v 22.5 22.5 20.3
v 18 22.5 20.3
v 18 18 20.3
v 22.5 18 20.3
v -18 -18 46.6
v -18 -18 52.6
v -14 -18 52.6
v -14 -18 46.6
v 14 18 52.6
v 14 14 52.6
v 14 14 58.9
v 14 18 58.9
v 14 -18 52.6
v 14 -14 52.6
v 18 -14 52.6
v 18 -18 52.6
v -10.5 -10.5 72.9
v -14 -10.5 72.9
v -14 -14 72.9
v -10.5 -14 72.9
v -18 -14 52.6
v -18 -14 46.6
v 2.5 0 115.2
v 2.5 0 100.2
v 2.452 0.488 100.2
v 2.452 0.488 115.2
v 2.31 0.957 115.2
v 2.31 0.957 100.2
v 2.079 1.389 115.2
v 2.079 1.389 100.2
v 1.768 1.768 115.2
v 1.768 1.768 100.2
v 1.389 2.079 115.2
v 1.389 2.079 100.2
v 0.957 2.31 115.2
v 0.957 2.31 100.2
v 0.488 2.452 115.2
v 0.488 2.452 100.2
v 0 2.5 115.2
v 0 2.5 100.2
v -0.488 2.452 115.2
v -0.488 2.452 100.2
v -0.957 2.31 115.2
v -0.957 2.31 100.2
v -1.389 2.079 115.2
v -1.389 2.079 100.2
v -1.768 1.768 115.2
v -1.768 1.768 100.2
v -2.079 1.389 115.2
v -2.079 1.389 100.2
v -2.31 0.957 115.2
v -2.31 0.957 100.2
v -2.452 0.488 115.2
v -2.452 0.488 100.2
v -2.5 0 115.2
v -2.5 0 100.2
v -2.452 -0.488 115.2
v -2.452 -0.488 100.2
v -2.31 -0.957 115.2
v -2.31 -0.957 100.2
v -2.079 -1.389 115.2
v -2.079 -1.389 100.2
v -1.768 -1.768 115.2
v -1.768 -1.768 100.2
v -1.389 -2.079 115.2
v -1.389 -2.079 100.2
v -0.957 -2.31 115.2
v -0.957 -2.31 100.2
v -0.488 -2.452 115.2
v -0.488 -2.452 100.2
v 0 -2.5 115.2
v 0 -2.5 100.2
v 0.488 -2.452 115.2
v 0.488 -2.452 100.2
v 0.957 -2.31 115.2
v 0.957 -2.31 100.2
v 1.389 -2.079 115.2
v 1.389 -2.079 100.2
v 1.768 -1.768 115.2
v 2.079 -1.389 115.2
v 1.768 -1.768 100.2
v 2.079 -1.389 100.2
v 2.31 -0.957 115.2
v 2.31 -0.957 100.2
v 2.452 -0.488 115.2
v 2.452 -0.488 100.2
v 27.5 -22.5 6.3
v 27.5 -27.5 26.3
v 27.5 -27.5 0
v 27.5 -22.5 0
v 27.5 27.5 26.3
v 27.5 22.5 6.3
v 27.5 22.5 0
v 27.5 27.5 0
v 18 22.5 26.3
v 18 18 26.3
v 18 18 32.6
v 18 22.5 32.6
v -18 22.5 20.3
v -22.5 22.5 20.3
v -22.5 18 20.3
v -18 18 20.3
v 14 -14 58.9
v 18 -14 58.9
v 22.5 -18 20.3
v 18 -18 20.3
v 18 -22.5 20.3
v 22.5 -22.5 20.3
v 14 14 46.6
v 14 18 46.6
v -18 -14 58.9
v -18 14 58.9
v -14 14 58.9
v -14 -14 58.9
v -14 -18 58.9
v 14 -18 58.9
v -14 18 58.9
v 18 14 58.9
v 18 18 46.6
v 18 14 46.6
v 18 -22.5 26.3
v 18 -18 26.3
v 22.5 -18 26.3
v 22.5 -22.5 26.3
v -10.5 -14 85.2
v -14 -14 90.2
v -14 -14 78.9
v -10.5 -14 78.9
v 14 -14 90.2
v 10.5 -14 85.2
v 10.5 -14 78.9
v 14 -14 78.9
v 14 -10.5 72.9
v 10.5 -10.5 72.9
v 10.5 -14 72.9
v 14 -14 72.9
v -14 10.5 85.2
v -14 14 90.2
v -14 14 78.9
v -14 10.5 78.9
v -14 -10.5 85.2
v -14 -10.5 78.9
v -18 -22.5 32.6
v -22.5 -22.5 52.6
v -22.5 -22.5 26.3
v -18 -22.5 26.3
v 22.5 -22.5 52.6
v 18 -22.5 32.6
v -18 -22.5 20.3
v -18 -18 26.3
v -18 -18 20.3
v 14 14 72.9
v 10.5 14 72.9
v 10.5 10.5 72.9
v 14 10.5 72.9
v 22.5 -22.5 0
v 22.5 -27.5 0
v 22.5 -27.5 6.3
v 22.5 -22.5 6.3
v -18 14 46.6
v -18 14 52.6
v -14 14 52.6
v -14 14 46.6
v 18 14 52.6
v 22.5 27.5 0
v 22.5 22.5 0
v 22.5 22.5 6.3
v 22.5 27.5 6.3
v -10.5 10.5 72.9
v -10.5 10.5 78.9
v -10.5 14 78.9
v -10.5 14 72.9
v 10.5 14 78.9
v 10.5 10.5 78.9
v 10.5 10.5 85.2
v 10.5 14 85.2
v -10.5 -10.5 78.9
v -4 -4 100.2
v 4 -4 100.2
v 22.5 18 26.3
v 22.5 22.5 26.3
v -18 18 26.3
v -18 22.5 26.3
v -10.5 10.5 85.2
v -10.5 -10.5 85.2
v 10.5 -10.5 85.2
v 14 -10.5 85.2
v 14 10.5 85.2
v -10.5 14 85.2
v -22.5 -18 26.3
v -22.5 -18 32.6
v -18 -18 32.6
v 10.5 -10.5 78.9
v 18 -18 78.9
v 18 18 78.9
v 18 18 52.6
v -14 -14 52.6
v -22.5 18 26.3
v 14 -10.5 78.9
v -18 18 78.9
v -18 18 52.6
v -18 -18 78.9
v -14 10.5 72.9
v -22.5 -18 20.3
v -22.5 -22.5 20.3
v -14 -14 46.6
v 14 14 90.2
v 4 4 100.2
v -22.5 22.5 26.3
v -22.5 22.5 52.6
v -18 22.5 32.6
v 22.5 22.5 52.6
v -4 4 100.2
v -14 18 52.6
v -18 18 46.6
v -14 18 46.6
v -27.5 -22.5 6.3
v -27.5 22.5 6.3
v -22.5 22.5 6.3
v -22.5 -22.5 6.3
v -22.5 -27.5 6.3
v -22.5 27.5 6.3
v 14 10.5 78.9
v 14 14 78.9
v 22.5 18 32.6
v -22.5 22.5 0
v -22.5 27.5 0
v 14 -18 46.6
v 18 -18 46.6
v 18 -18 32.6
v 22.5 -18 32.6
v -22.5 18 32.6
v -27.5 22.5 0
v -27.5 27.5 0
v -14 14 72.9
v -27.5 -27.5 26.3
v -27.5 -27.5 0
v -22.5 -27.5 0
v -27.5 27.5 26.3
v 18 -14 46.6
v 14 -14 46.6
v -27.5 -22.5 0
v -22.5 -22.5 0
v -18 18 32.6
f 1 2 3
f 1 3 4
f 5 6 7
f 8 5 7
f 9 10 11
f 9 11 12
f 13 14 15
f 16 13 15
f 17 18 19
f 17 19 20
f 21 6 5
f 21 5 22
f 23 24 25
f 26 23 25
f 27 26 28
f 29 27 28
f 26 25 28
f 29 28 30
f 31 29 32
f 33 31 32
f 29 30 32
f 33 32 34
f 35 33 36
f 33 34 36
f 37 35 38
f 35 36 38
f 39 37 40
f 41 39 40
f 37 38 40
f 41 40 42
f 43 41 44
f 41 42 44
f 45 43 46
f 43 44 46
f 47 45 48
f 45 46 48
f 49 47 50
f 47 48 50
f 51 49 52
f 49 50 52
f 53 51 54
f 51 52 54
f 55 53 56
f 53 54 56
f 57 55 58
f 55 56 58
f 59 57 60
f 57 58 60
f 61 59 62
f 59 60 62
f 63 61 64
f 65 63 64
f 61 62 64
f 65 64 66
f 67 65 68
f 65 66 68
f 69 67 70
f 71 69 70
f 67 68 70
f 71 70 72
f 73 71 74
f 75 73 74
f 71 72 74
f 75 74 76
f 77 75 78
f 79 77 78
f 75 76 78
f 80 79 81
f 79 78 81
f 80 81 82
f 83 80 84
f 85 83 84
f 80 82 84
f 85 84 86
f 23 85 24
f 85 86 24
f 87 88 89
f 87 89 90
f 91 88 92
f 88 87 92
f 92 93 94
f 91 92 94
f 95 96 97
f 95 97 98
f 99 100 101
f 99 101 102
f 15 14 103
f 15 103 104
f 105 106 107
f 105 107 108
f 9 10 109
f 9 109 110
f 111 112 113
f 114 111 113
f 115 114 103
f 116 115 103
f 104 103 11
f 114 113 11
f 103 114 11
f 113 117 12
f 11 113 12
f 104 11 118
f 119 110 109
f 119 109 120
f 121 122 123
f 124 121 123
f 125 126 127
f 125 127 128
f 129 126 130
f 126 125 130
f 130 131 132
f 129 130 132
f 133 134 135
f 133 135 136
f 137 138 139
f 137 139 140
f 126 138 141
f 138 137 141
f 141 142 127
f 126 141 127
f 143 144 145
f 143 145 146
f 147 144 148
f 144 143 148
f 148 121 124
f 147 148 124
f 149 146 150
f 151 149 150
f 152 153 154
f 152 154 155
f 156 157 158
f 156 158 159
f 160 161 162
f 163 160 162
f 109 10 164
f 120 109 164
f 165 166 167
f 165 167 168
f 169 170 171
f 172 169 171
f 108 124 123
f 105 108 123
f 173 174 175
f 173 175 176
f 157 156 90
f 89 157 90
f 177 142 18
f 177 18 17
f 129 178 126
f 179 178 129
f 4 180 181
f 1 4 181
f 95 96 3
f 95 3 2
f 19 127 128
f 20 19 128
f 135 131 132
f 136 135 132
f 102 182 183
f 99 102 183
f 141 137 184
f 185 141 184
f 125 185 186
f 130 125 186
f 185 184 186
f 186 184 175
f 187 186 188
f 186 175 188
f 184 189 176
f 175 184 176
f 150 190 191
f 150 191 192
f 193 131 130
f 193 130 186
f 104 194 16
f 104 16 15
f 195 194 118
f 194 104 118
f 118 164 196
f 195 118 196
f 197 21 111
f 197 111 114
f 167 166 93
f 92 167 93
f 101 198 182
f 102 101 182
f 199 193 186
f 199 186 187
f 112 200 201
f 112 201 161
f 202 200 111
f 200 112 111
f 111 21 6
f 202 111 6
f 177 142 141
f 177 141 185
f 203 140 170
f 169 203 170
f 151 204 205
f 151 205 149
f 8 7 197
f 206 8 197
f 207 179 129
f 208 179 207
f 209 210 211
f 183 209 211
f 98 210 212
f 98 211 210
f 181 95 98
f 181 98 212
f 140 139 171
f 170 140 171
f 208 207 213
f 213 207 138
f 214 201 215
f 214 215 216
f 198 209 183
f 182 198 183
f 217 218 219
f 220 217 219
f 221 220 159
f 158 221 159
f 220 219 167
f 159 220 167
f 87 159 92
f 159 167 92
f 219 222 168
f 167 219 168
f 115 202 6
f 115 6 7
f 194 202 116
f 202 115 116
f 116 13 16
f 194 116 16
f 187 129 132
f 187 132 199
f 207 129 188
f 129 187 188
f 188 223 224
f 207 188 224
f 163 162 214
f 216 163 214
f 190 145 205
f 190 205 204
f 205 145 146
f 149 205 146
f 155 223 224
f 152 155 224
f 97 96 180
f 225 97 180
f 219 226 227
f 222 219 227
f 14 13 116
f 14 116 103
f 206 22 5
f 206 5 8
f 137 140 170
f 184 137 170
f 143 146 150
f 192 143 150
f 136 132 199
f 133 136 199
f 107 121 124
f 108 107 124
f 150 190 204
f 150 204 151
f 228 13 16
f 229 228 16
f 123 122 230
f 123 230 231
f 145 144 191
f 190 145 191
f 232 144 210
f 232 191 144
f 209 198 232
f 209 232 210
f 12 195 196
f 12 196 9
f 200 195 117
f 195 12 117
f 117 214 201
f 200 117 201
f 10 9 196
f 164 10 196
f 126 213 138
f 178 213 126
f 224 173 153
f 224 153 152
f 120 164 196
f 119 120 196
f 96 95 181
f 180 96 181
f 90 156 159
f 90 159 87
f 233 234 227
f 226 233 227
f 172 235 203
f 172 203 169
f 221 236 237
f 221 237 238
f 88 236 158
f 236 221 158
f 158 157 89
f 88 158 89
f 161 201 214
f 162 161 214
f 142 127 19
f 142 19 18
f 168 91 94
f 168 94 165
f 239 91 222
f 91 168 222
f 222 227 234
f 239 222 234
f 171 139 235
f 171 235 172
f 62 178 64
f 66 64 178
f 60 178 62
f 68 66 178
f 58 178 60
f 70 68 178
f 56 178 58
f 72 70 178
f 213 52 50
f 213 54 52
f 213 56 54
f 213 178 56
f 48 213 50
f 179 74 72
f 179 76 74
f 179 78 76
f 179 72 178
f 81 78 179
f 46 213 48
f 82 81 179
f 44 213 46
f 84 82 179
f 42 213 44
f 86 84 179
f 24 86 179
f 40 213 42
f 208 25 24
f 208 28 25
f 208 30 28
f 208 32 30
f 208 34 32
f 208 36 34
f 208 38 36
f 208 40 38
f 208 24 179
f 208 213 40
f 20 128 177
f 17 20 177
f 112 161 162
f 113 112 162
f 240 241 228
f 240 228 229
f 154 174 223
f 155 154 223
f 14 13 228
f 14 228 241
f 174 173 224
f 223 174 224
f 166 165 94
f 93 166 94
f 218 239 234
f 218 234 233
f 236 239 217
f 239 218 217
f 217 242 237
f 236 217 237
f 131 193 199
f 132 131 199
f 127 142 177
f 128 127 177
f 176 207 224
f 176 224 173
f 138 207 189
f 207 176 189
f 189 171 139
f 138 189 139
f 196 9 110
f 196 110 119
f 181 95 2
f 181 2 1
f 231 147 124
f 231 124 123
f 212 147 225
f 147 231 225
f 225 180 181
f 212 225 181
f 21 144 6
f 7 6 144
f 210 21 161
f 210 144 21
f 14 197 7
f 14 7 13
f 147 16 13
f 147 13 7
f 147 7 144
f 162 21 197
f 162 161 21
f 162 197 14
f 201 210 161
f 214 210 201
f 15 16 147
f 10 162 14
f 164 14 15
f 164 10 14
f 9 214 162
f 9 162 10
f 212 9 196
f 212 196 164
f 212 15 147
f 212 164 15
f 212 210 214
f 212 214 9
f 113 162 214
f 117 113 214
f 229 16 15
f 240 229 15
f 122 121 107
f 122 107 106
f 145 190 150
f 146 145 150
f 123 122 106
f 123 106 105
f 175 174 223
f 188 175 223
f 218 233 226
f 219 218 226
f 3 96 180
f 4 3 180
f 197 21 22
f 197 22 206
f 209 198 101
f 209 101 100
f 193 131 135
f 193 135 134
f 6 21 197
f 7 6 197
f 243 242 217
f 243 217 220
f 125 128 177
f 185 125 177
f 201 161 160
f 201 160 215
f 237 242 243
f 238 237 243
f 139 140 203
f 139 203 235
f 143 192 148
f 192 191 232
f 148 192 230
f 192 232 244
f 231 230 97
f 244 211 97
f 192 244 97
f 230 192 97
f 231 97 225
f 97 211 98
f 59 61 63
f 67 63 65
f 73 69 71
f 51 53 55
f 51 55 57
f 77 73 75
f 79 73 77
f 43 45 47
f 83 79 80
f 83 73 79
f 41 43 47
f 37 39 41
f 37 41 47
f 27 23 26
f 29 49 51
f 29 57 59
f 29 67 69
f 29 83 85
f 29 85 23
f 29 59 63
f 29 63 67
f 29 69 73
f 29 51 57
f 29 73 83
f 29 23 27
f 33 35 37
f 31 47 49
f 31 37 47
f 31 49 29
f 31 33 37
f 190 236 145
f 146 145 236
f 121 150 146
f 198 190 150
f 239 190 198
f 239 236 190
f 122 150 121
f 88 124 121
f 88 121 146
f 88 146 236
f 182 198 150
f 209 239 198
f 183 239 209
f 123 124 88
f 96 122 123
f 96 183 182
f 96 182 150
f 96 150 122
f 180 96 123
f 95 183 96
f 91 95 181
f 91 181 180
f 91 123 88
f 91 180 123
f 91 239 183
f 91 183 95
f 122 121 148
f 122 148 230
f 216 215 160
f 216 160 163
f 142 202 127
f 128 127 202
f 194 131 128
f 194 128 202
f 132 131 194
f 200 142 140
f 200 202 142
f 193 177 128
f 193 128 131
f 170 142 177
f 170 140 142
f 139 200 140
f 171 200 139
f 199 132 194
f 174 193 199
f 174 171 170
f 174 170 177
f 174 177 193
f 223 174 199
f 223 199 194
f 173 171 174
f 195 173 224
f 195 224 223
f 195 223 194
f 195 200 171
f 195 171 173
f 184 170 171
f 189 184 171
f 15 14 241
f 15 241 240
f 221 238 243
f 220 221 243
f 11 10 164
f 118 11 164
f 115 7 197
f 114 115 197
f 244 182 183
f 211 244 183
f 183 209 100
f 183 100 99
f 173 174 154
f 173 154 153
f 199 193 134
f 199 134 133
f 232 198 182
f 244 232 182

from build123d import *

# Parameters (mm, degrees)
F0_W      = 5
F0_H      = 5
F1_DEPTH  = 6.3
F2_W      = 5
F2_H      = 5
F3_DEPTH  = 20
F4_W      = 4.5
F4_H      = 4.5
F5_DEPTH  = 6.3
F6_W      = 45
F6_H      = 45
F7_DEPTH  = 20
F8_W      = 4
F8_H      = 4
F9_DEPTH  = 6.3
F10_W     = 4
F10_H     = 4
F11_DEPTH = 20
F12_W     = 3.5
F12_H     = 3.5
F13_DEPTH = 6.3
F14_W     = 3.5
F14_H     = 3.5
F15_DEPTH = 15
F16_SIZE  = 10
F17_R     = 2.5
F18_DEPTH = 15
F19_DEPTH = 6
F20_DEPTH = 6
F21_DEPTH = 6


with BuildPart() as f1:
    # F0 (on Top) → F1 (new body)
    with BuildSketch(Plane.XY):
        with Locations((25, 25)):
            Rectangle(F0_W, F0_H)
    extrude(amount=F1_DEPTH)



with BuildPart() as f1b:
    # F0 (on Top) → F1, piece 2 (new body)
    with BuildSketch(Plane.XY):
        with Locations((-25, 25)):
            Rectangle(F0_W, F0_H)
    extrude(amount=F1_DEPTH)


with BuildPart() as f1c:
    # F0 (on Top) → F1, piece 3 (new body)
    with BuildSketch(Plane.XY):
        with Locations((-25, -25)):
            Rectangle(F0_W, F0_H)
    extrude(amount=F1_DEPTH)


with BuildPart() as f1d:
    # F0 (on Top) → F1, piece 4 (new body)
    with BuildSketch(Plane.XY):
        with Locations((25, -25)):
            Rectangle(F0_W, F0_H)
    extrude(amount=F1_DEPTH)


with BuildPart() as f1_1:
    add(f1.part)

    add(f1b.part)  # F3 merges F1b

    add(f1c.part)  # F3 merges F1c

    add(f1d.part)  # F3 merges F1d
    # F2 (on face) → F3 (join)
    with BuildSketch(Plane.XY.offset(6.3)):
        Polygon((22.5, 22.5), (22.5, 27.5), (-27.5, 27.5), (-27.5, -27.5), (27.5, -27.5), (27.5, 22.5), align=None)
        with Locations((25, 25)):
            Rectangle(F2_W, F2_H)
    extrude(amount=F3_DEPTH)

    # F4 (on face) → F21 (cut)
    with BuildSketch(Plane.XY.offset(26.3)):
        with Locations((-20.25, 20.25)):
            Rectangle(F4_W, F4_H)
        with Locations((20.25, 20.25)):
            Rectangle(F4_W, F4_H)
        with Locations((20.25, -20.25)):
            Rectangle(F4_W, F4_H)
        with Locations((-20.25, -20.25)):
            Rectangle(F4_W, F4_H)
    extrude(amount=-F21_DEPTH, mode=Mode.SUBTRACT)


with BuildPart() as f5:
    # F4 (on face) → F5 (new body)
    with BuildSketch(Plane.XY.offset(26.3)):
        with Locations((-20.25, 20.25)):
            Rectangle(F4_W, F4_H)
    extrude(amount=F5_DEPTH)



with BuildPart() as f5b:
    # F4 (on face) → F5, piece 2 (new body)
    with BuildSketch(Plane.XY.offset(26.3)):
        with Locations((20.25, 20.25)):
            Rectangle(F4_W, F4_H)
    extrude(amount=F5_DEPTH)


with BuildPart() as f5c:
    # F4 (on face) → F5, piece 3 (new body)
    with BuildSketch(Plane.XY.offset(26.3)):
        with Locations((20.25, -20.25)):
            Rectangle(F4_W, F4_H)
    extrude(amount=F5_DEPTH)


with BuildPart() as f5d:
    # F4 (on face) → F5, piece 4 (new body)
    with BuildSketch(Plane.XY.offset(26.3)):
        with Locations((-20.25, -20.25)):
            Rectangle(F4_W, F4_H)
    extrude(amount=F5_DEPTH)


with BuildPart() as f5_1:
    add(f5.part)

    add(f5b.part)  # F7 merges F5b

    add(f5c.part)  # F7 merges F5c

    add(f5d.part)  # F7 merges F5d
    # F6 (on face) → F7 (join)
    with BuildSketch(Plane.XY.offset(32.6)):
        Rectangle(F6_W, F6_H)
    extrude(amount=F7_DEPTH)

    # F8 (on face) → F19 (cut)
    with BuildSketch(Plane.XY.offset(52.6)):
        with Locations((-16, 16)):
            Rectangle(F8_W, F8_H)
        with Locations((16, 16)):
            Rectangle(F8_W, F8_H)
        with Locations((16, -16)):
            Rectangle(F8_W, F8_H)
        with Locations((-16, -16)):
            Rectangle(F8_W, F8_H)
    extrude(amount=-F19_DEPTH, mode=Mode.SUBTRACT)


with BuildPart() as f9:
    # F8 (on face) → F9 (new body)
    with BuildSketch(Plane.XY.offset(52.6)):
        with Locations((16, 16)):
            Rectangle(F8_W, F8_H)
    extrude(amount=F9_DEPTH)



with BuildPart() as f9b:
    # F8 (on face) → F9, piece 2 (new body)
    with BuildSketch(Plane.XY.offset(52.6)):
        with Locations((16, -16)):
            Rectangle(F8_W, F8_H)
    extrude(amount=F9_DEPTH)


with BuildPart() as f9c:
    # F8 (on face) → F9, piece 3 (new body)
    with BuildSketch(Plane.XY.offset(52.6)):
        with Locations((-16, -16)):
            Rectangle(F8_W, F8_H)
    extrude(amount=F9_DEPTH)


with BuildPart() as f9d:
    # F8 (on face) → F9, piece 4 (new body)
    with BuildSketch(Plane.XY.offset(52.6)):
        with Locations((-16, 16)):
            Rectangle(F8_W, F8_H)
    extrude(amount=F9_DEPTH)


with BuildPart() as f9_1:
    add(f9.part)

    add(f9b.part)  # F11 merges F9b

    add(f9c.part)  # F11 merges F9c

    add(f9d.part)  # F11 merges F9d
    # F10 (on face) → F11 (join)
    with BuildSketch(Plane.XY.offset(58.9)):
        with Locations((16, 16)):
            Rectangle(F10_W, F10_H)
        Polygon((14, 14), (14, 18), (-14, 18), (-14, 14), (-18, 14), (-18, -14), (-14, -14), (-14, -18), (14, -18), (14, -14), (18, -14), (18, 14), align=None)
        with Locations((-16, 16)):
            Rectangle(F10_W, F10_H)
        with Locations((16, -16)):
            Rectangle(F10_W, F10_H)
        with Locations((-16, -16)):
            Rectangle(F10_W, F10_H)
    extrude(amount=F11_DEPTH)

    # F12 (on face) → F13 (join)
    with BuildSketch(Plane.XY.offset(78.9)):
        with Locations((-12.25, 12.25)):
            Rectangle(F12_W, F12_H)
        with Locations((12.25, 12.25)):
            Rectangle(F12_W, F12_H)
        with Locations((12.25, -12.25)):
            Rectangle(F12_W, F12_H)
        with Locations((-12.25, -12.25)):
            Rectangle(F12_W, F12_H)
    extrude(amount=F13_DEPTH)

    # F14 (on face) → F15 (join)
    with BuildSketch(Plane.XY.offset(85.2)):
        Polygon((10.5, 10.5), (10.5, 14), (-14, 14), (-14, -14), (14, -14), (14, 10.5), align=None)
        with Locations((12.25, 12.25)):
            Rectangle(F14_W, F14_H)
    extrude(amount=F15_DEPTH)

    # F16
    f16_edges = [f9_1.edges().sort_by_distance(p)[0] for p in [
        (0, -14, 100.2),
        (-14, 0, 100.2),
        (0, 14, 100.2),
        (14, 0, 100.2),
    ]]
    chamfer(f16_edges, length=F16_SIZE)

    # F17 (on face) → F18 (join)
    with BuildSketch(Plane.XY.offset(100.2)):
        Circle(F17_R)
    extrude(amount=F18_DEPTH)

    # F12 (on face) → F20 (cut)
    with BuildSketch(Plane.XY.offset(78.9)):
        with Locations((-12.25, 12.25)):
            Rectangle(F12_W, F12_H)
        with Locations((12.25, 12.25)):
            Rectangle(F12_W, F12_H)
        with Locations((12.25, -12.25)):
            Rectangle(F12_W, F12_H)
        with Locations((-12.25, -12.25)):
            Rectangle(F12_W, F12_H)
    extrude(amount=-F20_DEPTH, mode=Mode.SUBTRACT)


solid = Compound([f1_1.part, f5_1.part, f9_1.part])
